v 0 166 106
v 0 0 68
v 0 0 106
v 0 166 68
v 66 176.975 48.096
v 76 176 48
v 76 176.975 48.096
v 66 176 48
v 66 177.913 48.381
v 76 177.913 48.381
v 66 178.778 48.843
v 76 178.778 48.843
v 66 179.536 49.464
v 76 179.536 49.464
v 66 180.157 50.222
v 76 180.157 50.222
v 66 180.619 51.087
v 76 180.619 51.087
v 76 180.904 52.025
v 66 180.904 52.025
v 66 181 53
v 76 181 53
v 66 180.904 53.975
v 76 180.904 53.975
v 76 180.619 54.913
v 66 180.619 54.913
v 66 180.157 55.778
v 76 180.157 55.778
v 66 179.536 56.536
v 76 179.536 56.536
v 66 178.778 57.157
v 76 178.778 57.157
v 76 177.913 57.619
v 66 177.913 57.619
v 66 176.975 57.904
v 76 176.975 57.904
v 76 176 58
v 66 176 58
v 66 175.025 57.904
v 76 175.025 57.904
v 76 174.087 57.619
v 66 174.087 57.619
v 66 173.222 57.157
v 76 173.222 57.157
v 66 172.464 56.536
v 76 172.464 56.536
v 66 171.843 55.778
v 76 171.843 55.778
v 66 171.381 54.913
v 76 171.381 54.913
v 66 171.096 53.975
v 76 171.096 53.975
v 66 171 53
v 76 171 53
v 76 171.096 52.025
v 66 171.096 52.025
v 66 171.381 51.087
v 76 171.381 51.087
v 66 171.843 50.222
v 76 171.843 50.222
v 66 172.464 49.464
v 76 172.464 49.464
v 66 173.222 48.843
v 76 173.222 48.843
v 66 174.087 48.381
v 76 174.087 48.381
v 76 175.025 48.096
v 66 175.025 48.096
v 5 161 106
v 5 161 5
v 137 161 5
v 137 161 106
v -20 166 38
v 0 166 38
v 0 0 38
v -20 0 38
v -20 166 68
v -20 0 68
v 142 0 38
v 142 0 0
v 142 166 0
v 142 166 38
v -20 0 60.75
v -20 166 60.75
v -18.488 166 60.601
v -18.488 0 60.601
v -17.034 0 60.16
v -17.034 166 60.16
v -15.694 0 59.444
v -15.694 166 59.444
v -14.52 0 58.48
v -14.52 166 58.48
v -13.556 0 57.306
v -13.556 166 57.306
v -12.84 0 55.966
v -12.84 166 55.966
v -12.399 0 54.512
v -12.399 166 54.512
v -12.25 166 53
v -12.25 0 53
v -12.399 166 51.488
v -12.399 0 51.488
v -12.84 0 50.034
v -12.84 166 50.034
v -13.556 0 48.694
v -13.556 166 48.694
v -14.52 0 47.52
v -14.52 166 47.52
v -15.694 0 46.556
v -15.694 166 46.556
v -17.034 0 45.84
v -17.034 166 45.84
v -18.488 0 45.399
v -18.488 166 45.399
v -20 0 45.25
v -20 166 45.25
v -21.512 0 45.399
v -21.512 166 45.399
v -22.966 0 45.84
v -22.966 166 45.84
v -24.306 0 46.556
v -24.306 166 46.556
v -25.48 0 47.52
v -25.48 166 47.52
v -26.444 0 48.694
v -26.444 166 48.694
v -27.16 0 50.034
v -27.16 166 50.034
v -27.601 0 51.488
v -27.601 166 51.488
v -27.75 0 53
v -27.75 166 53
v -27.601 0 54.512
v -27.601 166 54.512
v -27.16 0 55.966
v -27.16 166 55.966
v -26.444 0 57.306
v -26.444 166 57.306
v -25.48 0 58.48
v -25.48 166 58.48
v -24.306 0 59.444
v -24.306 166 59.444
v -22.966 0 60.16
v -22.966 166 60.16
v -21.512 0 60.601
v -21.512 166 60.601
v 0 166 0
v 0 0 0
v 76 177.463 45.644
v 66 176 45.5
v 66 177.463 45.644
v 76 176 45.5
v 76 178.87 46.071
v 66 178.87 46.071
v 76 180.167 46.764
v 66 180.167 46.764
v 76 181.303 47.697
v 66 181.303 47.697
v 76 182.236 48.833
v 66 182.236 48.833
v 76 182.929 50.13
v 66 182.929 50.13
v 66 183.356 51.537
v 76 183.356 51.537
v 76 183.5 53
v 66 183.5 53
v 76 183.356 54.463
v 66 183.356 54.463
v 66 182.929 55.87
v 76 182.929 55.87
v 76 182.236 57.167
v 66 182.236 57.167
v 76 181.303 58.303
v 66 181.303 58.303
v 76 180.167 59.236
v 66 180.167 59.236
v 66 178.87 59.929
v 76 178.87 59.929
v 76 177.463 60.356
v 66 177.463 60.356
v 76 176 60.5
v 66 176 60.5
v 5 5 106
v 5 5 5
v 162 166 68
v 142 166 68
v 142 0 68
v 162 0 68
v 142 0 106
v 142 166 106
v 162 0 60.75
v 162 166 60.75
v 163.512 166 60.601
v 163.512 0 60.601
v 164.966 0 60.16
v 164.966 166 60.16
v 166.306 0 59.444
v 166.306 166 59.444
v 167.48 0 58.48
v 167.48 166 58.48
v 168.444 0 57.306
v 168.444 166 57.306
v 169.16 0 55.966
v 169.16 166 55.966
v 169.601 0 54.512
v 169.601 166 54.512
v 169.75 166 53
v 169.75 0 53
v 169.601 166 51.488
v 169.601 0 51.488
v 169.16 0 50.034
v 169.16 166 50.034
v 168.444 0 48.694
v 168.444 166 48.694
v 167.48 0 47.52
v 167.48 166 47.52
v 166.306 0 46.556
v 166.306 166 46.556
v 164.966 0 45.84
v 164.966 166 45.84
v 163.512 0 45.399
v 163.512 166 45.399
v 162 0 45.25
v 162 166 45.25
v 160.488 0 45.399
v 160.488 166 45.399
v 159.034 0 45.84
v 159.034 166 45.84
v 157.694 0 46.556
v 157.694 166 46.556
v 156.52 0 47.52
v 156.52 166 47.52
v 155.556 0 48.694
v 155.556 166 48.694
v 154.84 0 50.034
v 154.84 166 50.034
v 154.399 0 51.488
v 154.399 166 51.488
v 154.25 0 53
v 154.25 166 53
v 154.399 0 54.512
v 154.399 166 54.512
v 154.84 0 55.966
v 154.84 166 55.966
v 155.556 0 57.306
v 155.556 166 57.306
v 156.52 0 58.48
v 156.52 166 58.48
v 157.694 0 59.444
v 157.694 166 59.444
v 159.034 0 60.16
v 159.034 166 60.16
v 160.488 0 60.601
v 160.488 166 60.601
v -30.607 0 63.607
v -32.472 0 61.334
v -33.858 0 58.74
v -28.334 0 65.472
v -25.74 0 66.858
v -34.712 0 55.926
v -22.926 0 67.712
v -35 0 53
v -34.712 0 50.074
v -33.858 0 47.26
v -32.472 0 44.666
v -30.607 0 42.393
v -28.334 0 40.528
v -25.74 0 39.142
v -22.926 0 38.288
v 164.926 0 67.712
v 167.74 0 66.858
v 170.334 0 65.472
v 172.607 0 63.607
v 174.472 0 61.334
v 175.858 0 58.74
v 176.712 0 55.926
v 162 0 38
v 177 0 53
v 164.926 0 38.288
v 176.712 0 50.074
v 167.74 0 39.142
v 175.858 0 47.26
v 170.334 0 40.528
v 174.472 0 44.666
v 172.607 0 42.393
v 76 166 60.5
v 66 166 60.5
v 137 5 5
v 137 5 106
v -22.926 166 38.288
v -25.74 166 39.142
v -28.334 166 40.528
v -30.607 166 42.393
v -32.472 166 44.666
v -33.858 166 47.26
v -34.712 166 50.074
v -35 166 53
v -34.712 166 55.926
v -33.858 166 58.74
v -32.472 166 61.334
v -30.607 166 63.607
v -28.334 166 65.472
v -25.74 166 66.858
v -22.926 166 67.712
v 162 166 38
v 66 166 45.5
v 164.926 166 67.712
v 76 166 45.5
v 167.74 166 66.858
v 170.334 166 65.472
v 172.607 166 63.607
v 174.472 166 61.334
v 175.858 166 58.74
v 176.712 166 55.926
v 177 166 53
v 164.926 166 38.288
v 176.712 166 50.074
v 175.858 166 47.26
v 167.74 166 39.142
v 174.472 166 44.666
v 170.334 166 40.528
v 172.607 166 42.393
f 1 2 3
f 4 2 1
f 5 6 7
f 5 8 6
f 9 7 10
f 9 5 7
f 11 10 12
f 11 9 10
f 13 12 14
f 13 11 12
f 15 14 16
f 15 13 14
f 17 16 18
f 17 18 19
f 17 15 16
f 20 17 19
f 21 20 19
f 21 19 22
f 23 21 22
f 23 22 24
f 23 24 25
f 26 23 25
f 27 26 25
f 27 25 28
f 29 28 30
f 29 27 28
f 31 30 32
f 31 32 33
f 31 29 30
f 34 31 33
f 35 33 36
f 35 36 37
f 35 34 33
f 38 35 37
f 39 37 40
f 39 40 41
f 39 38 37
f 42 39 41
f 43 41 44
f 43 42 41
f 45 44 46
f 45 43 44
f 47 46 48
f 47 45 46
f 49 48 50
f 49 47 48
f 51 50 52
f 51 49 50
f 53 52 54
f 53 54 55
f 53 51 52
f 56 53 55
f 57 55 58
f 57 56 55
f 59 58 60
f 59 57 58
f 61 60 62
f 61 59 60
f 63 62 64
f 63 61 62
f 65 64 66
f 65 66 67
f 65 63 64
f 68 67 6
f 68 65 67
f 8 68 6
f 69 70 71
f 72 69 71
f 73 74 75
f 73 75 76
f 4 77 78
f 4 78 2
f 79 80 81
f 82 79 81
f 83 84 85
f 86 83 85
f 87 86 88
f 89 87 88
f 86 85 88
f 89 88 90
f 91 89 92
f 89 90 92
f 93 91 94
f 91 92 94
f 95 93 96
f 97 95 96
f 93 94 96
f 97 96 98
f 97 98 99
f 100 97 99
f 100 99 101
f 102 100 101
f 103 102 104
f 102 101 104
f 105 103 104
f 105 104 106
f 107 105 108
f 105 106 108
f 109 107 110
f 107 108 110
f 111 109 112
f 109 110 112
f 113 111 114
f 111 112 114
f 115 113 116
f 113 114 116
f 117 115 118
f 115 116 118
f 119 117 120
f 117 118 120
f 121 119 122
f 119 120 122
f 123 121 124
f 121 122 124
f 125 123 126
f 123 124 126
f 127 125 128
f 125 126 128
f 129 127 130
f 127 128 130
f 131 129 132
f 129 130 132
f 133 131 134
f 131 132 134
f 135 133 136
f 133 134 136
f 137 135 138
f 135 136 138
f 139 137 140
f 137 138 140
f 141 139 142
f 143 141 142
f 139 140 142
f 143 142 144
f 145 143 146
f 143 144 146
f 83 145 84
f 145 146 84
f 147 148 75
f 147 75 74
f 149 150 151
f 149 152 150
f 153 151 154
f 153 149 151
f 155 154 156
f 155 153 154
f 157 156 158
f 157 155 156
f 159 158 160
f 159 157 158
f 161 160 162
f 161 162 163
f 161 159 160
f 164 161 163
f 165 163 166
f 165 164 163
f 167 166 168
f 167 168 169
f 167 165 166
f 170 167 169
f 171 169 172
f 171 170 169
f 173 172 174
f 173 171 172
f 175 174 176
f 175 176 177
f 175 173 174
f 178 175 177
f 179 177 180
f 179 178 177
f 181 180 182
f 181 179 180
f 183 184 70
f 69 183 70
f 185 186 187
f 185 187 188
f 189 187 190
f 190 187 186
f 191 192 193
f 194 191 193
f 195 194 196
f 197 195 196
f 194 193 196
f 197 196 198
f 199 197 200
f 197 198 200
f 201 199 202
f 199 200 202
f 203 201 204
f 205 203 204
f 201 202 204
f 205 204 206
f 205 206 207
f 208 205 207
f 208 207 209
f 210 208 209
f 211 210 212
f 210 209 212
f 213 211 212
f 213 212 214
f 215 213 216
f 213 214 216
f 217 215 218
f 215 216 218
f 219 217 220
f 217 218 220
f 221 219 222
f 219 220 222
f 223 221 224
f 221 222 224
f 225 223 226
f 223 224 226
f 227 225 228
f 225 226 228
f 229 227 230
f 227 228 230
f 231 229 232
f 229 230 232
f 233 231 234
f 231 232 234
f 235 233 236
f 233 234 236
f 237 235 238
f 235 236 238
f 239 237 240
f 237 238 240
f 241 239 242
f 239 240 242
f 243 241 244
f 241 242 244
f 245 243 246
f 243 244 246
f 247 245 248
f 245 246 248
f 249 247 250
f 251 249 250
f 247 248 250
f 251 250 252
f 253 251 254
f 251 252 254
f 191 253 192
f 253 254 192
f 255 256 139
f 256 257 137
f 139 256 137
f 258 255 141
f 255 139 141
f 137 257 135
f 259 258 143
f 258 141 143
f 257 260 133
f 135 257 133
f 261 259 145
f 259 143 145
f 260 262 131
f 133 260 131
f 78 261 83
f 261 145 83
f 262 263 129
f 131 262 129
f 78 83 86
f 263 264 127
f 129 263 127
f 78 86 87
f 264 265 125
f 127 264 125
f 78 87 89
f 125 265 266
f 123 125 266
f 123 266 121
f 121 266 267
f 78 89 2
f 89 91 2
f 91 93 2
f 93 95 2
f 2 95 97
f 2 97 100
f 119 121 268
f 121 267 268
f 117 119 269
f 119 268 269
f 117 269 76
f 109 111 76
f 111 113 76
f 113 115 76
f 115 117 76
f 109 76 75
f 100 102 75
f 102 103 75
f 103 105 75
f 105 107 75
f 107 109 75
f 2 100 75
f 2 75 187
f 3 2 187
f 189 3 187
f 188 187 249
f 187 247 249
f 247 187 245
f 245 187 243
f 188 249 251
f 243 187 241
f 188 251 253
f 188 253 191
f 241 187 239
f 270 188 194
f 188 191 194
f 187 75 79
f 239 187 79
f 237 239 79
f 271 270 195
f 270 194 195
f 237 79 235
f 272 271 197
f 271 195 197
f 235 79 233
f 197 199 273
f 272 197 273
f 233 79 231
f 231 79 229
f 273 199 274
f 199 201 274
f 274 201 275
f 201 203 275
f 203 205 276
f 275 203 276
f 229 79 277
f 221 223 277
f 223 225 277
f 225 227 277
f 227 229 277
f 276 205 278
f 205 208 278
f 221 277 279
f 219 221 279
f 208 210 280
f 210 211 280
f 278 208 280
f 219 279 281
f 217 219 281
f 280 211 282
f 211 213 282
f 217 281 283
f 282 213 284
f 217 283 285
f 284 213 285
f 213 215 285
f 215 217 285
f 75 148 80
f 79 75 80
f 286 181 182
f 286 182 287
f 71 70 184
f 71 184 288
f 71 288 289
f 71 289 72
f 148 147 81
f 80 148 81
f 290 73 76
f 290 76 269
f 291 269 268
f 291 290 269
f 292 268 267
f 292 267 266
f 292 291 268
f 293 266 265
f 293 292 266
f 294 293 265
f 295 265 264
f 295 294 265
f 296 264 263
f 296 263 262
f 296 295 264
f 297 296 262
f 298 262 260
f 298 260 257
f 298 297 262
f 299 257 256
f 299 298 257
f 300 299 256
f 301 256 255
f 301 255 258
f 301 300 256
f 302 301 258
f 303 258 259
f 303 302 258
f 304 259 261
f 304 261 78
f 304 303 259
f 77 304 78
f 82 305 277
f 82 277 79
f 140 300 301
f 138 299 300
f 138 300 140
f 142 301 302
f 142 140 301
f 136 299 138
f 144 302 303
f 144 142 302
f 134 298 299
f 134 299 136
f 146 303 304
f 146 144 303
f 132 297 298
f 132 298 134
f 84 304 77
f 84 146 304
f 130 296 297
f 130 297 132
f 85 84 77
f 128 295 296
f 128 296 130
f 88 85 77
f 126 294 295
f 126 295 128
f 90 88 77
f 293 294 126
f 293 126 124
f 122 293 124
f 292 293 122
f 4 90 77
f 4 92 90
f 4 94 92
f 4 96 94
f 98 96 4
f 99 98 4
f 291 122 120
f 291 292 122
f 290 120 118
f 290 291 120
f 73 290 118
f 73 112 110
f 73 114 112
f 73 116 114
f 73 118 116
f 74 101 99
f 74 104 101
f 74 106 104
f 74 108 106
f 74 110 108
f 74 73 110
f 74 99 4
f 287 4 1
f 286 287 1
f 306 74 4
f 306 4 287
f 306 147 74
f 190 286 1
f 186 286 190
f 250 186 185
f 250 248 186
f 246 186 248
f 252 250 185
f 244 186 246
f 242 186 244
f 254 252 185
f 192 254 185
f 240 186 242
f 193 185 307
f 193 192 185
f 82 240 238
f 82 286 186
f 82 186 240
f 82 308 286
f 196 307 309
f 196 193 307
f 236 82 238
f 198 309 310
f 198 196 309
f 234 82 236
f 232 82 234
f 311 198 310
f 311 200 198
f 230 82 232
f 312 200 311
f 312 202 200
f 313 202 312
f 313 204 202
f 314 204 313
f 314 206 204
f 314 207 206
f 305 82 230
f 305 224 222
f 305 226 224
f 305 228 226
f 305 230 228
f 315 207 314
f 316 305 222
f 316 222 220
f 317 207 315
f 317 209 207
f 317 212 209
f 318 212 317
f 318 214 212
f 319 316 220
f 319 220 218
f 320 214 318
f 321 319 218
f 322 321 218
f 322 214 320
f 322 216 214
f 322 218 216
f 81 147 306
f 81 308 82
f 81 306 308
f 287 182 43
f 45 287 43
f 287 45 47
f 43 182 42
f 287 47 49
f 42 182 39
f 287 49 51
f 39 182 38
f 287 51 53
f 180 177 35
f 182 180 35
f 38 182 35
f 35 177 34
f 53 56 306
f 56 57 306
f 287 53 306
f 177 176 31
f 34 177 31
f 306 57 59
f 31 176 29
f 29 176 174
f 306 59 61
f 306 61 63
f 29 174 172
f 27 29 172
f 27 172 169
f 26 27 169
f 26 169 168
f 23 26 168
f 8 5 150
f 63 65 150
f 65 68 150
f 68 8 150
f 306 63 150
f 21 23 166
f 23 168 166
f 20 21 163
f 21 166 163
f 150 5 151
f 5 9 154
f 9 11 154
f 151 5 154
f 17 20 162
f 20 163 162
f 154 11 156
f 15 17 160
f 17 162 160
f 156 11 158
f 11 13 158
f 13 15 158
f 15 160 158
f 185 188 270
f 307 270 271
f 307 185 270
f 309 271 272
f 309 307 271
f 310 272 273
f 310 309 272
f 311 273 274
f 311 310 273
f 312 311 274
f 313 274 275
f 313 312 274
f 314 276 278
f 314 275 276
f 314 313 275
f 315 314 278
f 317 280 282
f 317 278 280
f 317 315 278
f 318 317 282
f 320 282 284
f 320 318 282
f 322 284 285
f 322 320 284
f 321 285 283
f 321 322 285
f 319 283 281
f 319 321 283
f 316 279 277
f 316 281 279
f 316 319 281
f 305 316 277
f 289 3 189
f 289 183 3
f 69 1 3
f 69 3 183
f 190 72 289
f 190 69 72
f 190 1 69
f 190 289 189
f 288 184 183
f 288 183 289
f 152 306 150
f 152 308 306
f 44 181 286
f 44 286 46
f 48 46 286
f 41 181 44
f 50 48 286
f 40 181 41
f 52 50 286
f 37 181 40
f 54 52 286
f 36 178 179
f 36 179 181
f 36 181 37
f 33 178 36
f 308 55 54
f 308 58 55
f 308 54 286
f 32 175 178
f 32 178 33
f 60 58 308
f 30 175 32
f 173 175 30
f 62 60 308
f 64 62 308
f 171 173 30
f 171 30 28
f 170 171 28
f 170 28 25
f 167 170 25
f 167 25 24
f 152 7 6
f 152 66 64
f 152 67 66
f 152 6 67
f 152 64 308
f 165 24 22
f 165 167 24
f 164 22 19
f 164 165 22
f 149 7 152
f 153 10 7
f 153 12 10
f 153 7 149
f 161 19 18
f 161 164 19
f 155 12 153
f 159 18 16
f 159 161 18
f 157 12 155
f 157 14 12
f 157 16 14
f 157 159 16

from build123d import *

# Parameters (mm, degrees)
SKETCH_2_W      = 142
SKETCH_2_H      = 166
EXTRUDE_1_DEPTH = 106
SHELL_1_T       = -5
SKETCH_3_R      = 15
SKETCH_3_R_2    = 7.75
EXTRUDE_2_DEPTH = 166
SKETCH_4_R      = 5
EXTRUDE_3_DEPTH = 5


with BuildPart() as part:
    # 스케치2 → 보스-돌출1 (new body)
    with BuildSketch(Plane.XY):
        with Locations((71, 83)):
            Rectangle(SKETCH_2_W, SKETCH_2_H)
    extrude(amount=EXTRUDE_1_DEPTH)

    # 쉘1
    shell_1_openings = [part.faces().sort_by_distance(p)[0] for p in [
        (71, 83, 106),
    ]]
    offset(amount=SHELL_1_T, openings=shell_1_openings, kind=Kind.INTERSECTION)

    # 스케치3 → 보스-돌출2 (add)
    # profile 1 of 4: a face of its own
    with BuildSketch(Plane(origin=(0, 166, 0), x_dir=(1, 0, 0), z_dir=(0, 1, 0))):
        with Locations((-20, -53)):
            Circle(SKETCH_3_R)
        with Locations(Location((-20, -53, 0), (0, 0, 270))):
            Circle(SKETCH_3_R_2, mode=Mode.SUBTRACT)
    # profile 2 of 4: a face of its own
    with BuildSketch(Plane(origin=(0, 166, 0), x_dir=(1, 0, 0), z_dir=(0, 1, 0))):
        with BuildLine():
            Line((0, -38), (-20, -38))
            ThreePointArc((-20, -38), (-9.393398282, -42.393398282), (-5, -53))
            ThreePointArc((-5, -53), (-9.393398282, -63.606601718), (-20, -68))
            Line((-20, -68), (0, -68))
            Line((0, -68), (0, -38))
        make_face()
    # profile 3 of 4: a face of its own
    with BuildSketch(Plane(origin=(0, 166, 0), x_dir=(1, 0, 0), z_dir=(0, 1, 0))):
        with BuildLine():
            ThreePointArc((162, -68), (147, -53), (162, -38))
            Line((162, -38), (142, -38))
            Line((142, -38), (142, -68))
            Line((142, -68), (162, -68))
        make_face()
    # profile 4 of 4: a face of its own
    with BuildSketch(Plane(origin=(0, 166, 0), x_dir=(1, 0, 0), z_dir=(0, 1, 0))):
        with Locations((162, -53)):
            Circle(SKETCH_3_R)
        with Locations(Location((162, -53, 0), (0, 0, 270))):
            Circle(SKETCH_3_R_2, mode=Mode.SUBTRACT)
    extrude(amount=-EXTRUDE_2_DEPTH)

    # 스케치4 → 보스-돌출3 (add, symmetric)
    with BuildSketch(Plane(origin=(71, 0, 0), x_dir=(0, 0, -1), z_dir=(1, 0, 0))):
        with BuildLine():
            ThreePointArc((-45.5, 176), (-53, 183.5), (-60.5, 176))
            Line((-60.5, 176), (-60.5, 166))
            Line((-60.5, 166), (-45.5, 166))
            Line((-45.5, 166), (-45.5, 176))
        make_face()
        with Locations((-53, 176)):
            Circle(SKETCH_4_R, mode=Mode.SUBTRACT)
    extrude(amount=EXTRUDE_3_DEPTH, both=True)


solid = part.part
